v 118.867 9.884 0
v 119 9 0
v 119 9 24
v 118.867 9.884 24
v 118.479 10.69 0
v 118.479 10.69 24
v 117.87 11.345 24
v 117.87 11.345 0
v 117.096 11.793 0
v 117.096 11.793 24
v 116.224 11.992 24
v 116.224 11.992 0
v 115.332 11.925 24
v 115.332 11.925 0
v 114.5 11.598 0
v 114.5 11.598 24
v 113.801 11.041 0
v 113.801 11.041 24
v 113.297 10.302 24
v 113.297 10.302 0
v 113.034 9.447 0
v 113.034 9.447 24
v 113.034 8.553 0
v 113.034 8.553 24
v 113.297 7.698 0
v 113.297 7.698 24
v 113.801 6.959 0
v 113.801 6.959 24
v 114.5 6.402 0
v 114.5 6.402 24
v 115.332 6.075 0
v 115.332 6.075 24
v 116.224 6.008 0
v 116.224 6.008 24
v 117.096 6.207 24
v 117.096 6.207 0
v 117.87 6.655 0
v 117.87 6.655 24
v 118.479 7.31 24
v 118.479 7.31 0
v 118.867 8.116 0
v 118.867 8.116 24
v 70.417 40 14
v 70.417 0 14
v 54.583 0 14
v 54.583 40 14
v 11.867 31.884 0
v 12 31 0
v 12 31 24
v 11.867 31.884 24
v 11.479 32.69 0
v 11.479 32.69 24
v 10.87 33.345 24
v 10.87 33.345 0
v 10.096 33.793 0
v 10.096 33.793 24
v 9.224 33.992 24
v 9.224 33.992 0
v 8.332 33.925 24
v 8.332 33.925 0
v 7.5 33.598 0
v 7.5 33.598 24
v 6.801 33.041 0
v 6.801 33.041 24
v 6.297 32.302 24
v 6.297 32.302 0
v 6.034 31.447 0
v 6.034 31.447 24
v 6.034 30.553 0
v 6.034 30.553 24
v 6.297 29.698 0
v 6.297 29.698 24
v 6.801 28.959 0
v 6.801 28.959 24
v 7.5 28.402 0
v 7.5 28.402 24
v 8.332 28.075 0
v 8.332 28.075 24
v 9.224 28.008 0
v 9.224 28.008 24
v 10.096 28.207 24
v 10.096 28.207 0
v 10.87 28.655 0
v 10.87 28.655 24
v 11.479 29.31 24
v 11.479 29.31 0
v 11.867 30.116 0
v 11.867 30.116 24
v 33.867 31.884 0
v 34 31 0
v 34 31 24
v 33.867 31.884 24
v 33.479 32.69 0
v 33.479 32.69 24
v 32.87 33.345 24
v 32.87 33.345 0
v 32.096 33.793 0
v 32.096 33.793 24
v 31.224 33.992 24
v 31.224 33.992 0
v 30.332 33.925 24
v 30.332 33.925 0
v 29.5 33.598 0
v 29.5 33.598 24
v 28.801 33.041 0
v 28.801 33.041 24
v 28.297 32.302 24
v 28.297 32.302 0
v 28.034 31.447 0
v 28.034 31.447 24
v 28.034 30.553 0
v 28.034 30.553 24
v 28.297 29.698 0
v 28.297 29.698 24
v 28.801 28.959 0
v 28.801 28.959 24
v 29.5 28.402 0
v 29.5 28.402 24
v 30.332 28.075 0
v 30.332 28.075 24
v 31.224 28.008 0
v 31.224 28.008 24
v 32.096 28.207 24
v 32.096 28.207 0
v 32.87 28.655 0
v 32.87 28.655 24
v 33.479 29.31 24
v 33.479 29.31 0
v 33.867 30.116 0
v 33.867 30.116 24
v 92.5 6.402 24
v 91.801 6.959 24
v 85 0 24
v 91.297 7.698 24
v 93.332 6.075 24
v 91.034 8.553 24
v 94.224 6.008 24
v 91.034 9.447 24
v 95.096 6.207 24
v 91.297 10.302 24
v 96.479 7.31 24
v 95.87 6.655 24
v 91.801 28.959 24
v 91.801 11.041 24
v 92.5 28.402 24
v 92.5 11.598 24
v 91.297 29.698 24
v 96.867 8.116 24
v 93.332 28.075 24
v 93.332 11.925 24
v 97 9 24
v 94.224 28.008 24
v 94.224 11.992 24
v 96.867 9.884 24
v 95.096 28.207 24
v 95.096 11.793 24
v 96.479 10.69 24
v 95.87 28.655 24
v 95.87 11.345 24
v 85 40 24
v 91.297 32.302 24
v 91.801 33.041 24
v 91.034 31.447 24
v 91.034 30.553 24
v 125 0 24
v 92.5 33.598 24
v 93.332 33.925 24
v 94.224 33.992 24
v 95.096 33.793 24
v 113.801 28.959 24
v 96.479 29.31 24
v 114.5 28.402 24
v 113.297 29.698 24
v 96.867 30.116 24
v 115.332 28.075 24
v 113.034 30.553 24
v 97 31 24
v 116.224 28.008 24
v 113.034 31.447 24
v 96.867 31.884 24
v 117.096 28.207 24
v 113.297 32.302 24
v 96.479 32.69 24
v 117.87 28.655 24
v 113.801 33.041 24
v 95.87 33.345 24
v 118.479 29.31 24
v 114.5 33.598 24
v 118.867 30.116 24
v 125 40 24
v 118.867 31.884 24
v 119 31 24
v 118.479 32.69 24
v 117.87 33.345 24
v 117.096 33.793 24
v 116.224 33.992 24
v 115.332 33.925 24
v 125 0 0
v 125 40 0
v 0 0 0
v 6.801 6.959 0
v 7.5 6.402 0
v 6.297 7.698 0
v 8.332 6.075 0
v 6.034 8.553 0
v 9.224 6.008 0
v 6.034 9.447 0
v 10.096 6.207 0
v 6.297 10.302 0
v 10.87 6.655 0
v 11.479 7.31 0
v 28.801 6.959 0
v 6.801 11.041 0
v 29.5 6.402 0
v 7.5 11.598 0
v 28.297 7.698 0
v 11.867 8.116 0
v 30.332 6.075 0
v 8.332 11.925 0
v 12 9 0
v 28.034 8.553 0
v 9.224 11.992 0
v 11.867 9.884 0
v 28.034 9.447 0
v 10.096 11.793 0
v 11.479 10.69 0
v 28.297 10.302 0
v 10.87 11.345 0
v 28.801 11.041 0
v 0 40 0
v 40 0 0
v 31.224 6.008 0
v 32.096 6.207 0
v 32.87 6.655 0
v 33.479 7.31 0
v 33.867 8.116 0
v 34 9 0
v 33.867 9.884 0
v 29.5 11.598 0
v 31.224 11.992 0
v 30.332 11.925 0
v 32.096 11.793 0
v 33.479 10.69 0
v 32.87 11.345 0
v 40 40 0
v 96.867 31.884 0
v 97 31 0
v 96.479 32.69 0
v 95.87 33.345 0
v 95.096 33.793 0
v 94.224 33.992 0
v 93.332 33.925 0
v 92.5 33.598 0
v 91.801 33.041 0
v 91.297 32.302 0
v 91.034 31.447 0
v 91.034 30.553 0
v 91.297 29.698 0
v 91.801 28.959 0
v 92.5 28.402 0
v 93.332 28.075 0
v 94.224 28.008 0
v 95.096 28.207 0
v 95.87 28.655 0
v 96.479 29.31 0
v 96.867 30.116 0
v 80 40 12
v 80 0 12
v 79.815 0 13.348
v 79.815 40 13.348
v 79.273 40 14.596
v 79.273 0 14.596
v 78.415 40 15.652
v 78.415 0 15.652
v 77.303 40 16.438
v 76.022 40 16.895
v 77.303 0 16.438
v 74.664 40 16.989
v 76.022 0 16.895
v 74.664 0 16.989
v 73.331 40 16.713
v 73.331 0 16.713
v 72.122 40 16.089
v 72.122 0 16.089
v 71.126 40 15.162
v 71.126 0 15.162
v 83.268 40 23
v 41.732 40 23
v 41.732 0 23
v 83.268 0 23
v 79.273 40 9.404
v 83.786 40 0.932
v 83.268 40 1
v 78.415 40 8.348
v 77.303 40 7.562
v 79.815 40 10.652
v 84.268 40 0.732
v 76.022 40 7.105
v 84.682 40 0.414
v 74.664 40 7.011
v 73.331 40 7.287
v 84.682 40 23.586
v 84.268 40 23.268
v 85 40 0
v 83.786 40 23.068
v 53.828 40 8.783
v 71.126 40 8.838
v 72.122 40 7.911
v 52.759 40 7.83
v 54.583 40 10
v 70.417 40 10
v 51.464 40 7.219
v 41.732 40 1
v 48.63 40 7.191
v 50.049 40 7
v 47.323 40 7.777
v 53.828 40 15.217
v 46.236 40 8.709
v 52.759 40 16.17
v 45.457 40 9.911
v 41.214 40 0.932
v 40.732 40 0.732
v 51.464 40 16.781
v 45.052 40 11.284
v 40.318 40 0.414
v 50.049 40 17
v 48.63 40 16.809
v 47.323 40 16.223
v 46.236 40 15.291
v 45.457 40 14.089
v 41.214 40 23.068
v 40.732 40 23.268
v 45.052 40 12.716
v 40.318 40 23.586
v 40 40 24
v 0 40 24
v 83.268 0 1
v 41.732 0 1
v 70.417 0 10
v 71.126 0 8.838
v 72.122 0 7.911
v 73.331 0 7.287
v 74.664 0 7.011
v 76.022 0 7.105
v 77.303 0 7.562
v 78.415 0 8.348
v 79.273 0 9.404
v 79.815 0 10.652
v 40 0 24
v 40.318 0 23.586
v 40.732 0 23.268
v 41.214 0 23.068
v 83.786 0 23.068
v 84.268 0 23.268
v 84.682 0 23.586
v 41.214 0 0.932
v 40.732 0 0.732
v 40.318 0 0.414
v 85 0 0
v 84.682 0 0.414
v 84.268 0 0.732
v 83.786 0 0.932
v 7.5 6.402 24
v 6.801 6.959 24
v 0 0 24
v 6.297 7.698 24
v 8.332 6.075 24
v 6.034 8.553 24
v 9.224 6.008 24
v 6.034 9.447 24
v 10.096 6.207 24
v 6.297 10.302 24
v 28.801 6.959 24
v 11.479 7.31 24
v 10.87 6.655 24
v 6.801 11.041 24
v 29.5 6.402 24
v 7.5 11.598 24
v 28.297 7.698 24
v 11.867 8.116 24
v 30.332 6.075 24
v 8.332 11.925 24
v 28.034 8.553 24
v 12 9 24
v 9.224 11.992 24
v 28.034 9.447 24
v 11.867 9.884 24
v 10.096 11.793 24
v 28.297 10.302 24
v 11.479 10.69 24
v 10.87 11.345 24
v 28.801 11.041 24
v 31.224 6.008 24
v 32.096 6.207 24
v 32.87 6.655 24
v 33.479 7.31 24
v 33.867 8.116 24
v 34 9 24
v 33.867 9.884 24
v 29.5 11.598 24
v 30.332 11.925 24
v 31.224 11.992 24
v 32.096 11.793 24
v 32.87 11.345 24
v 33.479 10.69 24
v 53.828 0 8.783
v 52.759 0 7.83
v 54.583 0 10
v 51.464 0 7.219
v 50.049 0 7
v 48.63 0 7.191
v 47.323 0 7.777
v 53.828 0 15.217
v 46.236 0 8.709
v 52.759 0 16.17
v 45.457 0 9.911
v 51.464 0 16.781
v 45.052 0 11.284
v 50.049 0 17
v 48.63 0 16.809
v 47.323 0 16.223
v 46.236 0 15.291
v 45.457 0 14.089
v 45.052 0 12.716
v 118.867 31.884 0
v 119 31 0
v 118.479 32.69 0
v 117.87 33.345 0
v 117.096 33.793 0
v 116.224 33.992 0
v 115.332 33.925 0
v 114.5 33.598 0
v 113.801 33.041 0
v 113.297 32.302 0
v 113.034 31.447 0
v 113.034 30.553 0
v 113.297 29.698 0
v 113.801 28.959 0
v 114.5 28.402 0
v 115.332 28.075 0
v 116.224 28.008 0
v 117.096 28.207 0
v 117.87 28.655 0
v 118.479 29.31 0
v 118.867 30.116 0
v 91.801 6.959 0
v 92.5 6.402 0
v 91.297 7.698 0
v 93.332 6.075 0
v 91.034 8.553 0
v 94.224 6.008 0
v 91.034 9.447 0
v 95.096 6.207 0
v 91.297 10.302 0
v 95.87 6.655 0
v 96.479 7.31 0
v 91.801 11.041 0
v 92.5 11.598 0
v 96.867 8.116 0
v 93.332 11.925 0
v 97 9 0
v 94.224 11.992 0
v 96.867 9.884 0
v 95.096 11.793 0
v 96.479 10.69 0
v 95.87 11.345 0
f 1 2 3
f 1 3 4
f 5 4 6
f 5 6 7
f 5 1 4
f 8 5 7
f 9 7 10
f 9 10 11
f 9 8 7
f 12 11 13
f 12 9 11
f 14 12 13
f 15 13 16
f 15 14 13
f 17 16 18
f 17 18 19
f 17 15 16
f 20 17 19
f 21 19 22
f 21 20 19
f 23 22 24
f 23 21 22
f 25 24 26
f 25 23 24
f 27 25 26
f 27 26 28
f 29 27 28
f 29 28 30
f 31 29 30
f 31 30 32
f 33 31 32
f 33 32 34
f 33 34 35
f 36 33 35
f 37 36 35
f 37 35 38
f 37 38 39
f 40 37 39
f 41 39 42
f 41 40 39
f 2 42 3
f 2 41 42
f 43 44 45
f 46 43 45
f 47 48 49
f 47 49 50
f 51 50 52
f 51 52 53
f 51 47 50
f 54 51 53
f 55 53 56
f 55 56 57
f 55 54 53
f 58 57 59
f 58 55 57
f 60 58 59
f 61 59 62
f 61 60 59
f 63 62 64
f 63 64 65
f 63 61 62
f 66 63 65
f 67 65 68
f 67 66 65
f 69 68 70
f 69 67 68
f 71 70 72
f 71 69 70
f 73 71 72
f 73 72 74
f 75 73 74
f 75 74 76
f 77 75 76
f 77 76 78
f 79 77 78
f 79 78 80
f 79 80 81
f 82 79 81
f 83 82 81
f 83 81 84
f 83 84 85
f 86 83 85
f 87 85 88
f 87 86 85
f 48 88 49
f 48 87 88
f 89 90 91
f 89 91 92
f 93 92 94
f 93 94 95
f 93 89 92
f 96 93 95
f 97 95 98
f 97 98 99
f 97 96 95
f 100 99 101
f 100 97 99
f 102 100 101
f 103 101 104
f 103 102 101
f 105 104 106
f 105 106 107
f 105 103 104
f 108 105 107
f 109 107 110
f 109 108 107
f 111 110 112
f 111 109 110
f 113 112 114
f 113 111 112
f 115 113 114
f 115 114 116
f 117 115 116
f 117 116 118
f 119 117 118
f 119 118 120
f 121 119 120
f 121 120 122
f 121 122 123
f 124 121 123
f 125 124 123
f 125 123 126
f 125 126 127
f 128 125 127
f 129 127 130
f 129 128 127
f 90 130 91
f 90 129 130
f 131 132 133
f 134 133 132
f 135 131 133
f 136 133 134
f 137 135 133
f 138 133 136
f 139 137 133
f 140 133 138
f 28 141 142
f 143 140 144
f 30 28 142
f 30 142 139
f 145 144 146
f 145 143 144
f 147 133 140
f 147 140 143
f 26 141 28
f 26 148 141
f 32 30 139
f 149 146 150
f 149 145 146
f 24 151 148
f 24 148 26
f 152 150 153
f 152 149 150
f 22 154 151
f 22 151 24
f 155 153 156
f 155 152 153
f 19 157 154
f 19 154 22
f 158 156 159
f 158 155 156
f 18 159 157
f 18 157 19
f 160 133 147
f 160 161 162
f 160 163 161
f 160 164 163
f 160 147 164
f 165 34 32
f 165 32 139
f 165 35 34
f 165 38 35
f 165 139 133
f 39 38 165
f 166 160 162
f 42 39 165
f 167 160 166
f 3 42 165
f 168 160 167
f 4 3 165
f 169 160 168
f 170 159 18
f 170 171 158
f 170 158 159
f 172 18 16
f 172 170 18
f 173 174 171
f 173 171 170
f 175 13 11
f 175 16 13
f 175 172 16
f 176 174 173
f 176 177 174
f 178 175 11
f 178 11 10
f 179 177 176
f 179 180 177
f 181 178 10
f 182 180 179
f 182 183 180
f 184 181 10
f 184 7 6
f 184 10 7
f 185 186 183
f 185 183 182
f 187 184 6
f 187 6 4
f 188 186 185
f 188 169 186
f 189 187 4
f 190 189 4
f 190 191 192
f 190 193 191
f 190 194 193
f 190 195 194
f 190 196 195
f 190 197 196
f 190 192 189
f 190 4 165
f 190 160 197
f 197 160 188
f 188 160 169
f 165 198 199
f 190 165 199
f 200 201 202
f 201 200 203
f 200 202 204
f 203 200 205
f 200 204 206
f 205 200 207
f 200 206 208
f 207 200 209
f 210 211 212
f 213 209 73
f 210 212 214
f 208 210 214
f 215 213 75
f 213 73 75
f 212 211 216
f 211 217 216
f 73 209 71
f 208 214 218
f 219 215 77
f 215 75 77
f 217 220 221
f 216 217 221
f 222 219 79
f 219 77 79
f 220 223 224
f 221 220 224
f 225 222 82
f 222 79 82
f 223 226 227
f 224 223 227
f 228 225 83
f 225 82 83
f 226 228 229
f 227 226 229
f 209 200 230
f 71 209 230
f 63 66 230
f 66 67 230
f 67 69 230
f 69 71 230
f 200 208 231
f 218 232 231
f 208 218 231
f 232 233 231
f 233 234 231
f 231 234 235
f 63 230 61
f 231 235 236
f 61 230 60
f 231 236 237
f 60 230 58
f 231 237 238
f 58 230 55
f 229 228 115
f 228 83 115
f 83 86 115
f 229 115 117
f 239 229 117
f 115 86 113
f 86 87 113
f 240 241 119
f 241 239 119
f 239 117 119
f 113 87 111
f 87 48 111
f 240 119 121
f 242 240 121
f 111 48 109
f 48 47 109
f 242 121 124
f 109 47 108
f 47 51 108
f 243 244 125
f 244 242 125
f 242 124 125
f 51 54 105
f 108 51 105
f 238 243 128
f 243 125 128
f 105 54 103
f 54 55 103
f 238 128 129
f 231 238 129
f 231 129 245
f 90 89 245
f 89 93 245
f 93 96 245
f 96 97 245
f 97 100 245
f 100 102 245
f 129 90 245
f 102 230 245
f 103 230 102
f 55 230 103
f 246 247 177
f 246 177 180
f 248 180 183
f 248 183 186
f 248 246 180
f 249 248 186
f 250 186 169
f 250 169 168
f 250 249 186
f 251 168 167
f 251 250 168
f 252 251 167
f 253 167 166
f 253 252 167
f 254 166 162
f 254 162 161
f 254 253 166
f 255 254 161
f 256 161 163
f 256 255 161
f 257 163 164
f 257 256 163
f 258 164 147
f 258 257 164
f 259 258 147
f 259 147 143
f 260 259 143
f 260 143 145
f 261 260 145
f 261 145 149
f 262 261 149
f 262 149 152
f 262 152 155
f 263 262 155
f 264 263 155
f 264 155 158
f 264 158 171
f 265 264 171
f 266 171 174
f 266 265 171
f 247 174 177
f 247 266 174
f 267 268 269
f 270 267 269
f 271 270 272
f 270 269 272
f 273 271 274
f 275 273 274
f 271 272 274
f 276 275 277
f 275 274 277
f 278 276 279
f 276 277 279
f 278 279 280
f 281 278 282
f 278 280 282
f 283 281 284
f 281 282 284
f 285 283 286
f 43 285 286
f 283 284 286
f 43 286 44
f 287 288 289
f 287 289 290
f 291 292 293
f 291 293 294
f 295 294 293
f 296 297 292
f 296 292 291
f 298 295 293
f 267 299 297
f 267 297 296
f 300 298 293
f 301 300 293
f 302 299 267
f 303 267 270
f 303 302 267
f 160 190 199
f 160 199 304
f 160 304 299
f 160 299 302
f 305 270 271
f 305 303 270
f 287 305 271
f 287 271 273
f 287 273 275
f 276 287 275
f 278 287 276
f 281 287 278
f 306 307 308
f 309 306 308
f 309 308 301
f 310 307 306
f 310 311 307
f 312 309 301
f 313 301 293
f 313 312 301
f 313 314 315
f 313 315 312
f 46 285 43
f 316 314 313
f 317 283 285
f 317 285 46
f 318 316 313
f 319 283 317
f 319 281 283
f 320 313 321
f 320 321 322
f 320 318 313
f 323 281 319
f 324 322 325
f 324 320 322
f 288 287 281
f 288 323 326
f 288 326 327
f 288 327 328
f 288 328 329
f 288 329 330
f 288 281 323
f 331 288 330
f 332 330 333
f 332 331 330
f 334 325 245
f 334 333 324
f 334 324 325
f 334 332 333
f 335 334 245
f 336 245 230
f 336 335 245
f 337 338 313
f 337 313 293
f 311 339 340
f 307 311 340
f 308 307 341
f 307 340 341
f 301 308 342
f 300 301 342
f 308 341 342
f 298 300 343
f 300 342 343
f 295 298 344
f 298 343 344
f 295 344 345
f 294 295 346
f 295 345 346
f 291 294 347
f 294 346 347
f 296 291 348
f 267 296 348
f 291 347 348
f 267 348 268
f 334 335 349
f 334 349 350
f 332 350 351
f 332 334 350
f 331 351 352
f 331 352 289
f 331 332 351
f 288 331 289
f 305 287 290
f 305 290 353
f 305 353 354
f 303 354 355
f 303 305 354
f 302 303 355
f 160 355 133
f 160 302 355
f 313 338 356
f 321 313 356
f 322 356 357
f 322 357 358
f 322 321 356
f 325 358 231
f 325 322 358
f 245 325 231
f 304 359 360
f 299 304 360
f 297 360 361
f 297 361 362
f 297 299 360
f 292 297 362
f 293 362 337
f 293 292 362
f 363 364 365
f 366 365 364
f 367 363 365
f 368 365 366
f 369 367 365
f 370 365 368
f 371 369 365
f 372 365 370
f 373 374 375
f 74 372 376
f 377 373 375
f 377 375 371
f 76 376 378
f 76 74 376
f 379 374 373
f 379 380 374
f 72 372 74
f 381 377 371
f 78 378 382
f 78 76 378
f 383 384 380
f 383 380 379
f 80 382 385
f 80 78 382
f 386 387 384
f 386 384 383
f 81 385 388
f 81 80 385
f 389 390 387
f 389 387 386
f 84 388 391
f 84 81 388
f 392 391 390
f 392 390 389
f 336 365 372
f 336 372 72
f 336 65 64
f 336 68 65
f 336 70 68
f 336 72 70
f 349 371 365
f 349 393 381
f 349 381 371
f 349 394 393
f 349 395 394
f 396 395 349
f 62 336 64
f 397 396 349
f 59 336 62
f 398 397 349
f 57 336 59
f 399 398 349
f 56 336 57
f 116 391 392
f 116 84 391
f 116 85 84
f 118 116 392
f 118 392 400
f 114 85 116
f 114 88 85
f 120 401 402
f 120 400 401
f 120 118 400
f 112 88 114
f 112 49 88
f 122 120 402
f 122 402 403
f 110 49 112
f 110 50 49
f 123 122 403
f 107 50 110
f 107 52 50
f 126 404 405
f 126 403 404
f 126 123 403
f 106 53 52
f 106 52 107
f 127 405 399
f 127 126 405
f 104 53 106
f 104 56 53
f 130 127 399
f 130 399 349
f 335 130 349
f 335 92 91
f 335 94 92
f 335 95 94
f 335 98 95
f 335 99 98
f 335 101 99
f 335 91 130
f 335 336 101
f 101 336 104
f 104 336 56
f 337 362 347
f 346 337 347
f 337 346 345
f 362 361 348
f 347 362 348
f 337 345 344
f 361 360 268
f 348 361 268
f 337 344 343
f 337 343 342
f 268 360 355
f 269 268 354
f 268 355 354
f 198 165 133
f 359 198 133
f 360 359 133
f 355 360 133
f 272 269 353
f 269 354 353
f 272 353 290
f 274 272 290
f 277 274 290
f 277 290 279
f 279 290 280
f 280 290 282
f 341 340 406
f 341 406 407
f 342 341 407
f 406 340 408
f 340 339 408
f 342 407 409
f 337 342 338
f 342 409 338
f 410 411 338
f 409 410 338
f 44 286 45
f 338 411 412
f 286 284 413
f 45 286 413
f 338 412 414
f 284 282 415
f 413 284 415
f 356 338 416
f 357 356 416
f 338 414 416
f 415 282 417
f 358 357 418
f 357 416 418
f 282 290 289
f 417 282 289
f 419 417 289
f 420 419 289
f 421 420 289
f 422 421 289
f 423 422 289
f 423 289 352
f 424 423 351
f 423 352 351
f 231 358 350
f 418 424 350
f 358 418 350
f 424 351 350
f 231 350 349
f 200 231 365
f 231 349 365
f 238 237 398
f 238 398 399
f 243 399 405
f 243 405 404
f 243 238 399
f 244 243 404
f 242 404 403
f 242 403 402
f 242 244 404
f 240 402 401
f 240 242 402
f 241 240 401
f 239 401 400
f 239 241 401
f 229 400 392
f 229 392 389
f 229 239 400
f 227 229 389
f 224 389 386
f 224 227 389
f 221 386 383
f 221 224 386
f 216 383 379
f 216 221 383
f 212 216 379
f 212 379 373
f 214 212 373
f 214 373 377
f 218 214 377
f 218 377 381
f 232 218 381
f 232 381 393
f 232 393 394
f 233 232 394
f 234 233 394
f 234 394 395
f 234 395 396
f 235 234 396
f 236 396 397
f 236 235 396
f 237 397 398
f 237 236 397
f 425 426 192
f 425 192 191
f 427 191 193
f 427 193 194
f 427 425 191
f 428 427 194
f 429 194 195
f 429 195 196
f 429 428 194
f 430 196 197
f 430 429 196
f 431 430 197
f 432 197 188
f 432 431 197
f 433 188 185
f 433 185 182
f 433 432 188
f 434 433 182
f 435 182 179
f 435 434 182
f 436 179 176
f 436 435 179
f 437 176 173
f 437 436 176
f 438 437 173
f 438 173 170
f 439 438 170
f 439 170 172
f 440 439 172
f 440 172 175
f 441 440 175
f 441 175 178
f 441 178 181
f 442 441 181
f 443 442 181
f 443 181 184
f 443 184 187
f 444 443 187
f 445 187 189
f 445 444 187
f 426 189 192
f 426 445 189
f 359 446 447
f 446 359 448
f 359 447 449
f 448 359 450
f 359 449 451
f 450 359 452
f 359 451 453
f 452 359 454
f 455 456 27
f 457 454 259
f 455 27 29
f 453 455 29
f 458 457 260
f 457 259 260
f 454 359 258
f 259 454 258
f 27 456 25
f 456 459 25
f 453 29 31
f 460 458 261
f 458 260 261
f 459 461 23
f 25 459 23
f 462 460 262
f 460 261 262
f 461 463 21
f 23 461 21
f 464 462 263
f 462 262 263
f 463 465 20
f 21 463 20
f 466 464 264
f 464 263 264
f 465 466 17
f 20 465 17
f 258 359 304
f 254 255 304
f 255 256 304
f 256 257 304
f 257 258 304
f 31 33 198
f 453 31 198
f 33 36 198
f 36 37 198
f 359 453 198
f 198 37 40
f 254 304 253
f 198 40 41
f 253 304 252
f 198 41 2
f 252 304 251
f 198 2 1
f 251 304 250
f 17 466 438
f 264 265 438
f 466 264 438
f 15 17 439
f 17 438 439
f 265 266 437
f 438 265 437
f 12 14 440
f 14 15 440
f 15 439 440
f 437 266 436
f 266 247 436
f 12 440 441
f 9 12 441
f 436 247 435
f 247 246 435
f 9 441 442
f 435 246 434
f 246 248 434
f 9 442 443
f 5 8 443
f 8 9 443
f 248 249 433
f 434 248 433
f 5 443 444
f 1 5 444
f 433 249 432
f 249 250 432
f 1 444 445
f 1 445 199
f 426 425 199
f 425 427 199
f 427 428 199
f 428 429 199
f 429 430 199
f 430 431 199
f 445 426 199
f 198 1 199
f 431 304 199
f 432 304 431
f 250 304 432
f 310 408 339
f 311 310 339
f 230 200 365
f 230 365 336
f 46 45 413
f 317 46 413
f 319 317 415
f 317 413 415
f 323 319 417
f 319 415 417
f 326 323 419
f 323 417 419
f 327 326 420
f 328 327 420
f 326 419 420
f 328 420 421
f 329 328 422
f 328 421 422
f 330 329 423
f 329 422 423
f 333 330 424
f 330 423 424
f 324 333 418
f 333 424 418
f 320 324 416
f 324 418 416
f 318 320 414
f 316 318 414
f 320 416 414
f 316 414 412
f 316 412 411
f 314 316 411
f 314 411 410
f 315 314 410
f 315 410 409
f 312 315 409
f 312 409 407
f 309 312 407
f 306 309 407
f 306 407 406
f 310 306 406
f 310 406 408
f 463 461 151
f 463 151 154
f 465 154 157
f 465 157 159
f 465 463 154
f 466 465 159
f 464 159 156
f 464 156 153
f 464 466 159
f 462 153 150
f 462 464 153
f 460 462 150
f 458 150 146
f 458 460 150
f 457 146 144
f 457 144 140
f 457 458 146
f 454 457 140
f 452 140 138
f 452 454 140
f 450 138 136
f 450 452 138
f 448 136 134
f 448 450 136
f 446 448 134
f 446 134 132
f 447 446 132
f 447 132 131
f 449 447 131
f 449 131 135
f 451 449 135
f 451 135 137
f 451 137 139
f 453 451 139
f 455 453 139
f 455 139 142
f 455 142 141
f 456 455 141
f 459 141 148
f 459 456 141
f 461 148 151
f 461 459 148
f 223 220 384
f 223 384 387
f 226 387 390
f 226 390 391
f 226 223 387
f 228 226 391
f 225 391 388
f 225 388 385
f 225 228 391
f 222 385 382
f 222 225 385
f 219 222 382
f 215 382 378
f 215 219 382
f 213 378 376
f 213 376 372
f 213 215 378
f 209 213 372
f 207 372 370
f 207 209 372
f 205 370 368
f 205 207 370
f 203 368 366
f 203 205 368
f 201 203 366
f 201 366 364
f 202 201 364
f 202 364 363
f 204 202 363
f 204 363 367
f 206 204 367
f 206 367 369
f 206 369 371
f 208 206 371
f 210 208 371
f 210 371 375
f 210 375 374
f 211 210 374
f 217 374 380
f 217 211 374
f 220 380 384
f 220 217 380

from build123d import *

# Parameters (mm, degrees)
F0_W        = 125
F0_H        = 40
F0_R        = 3
F1_DEPTH    = 24
F3_DEPTH    = 45
F4_W        = 45
F4_H        = 40
F5_DEPTH    = 1
F6_W        = 45
F6_H        = 40
F7_DEPTH    = 1
F8_T1_DEPTH = 40


# Not quite as in the source:
# - a fillet or chamfer that OpenCascade refuses, or shapes differently, is made with other operations: its cross-section is extruded or revolved along the edge and cut away or added


with BuildPart() as f1:
    # F0 (on Top) → F1 (new body)
    with BuildSketch(Plane.XY):
        with Locations((62.5, 20)):
            Rectangle(F0_W, F0_H)
        with Locations((9, 9)):
            Circle(F0_R, mode=Mode.SUBTRACT)
        with Locations((31, 9)):
            Circle(F0_R, mode=Mode.SUBTRACT)
        with Locations((94, 9)):
            Circle(F0_R, mode=Mode.SUBTRACT)
        with Locations((116, 9)):
            Circle(F0_R, mode=Mode.SUBTRACT)
        with Locations((9, 31)):
            Circle(F0_R, mode=Mode.SUBTRACT)
        with Locations((31, 31)):
            Circle(F0_R, mode=Mode.SUBTRACT)
        with Locations((94, 31)):
            Circle(F0_R, mode=Mode.SUBTRACT)
        with Locations((116, 31)):
            Circle(F0_R, mode=Mode.SUBTRACT)
    extrude(amount=F1_DEPTH)

    # F2 (on face) → F3 (cut)
    with BuildSketch(Plane.XZ):
        with BuildLine():
            Line((54, 14), (54.582575695, 14))
            ThreePointArc((54.582575695, 14), (45, 12), (54.582575695, 10))
            Line((54.582575695, 10), (54, 10))
            Line((54, 10), (54, 14))
        make_face()
        with BuildLine():
            ThreePointArc((54.582575695, 10), (54.8945315647, 10.9784517816), (55, 12))
            ThreePointArc((55, 12), (54.8945315647, 13.0215482184), (54.582575695, 14))
            Line((54.582575695, 14), (54, 14))
            Line((54, 14), (54, 10))
            Line((54, 10), (54.582575695, 10))
        make_face()
        with BuildLine():
            ThreePointArc((54.582575695, 14), (54.8945315647, 13.0215482184), (55, 12))
            ThreePointArc((55, 12), (54.8945315647, 10.9784517816), (54.582575695, 10))
            Line((54.582575695, 10), (70.417424305, 10))
            ThreePointArc((70.417424305, 10), (70, 12), (70.417424305, 14))
            Line((70.417424305, 14), (54.582575695, 14))
        make_face()
        with BuildLine():
            Line((71, 14), (70.417424305, 14))
            ThreePointArc((70.417424305, 14), (70, 12), (70.417424305, 10))
            Line((70.417424305, 10), (71, 10))
            Line((71, 10), (71, 14))
        make_face()
        with BuildLine():
            ThreePointArc((80, 12), (76.0215482184, 16.8945315647), (70.417424305, 14))
            Line((70.417424305, 14), (71, 14))
            Line((71, 14), (71, 10))
            Line((71, 10), (70.417424305, 10))
            ThreePointArc((70.417424305, 10), (76.0215482184, 7.1054684353), (80, 12))
        make_face()
    extrude(amount=-F3_DEPTH, mode=Mode.SUBTRACT)

    # F4 (on face) → F5 (cut)
    with BuildSketch(Plane.XY.offset(24)):
        with Locations((62.5, 20)):
            Rectangle(F4_W, F4_H)
    extrude(amount=-F5_DEPTH, mode=Mode.SUBTRACT)

    # F6 (on face) → F7 (cut)
    with BuildSketch(Plane(origin=(0, 0, 0), x_dir=(1, 0, 0), z_dir=(0, 0, -1))):
        with Locations((62.5, -20)):
            Rectangle(F6_W, F6_H)
    extrude(amount=-F7_DEPTH, mode=Mode.SUBTRACT)

    # F8: fillet of radius 2 on 4 edges, made by hand

    # F8_s2 → F8_t1 (join)
    with BuildSketch(Plane.XZ.offset(-40)):
        with BuildLine():
            ThreePointArc((41.7320508076, 1), (40.7320508076, 0.7320508076), (40, 0))
            Line((40, 0), (40, 1))
            Line((40, 1), (41.7320508076, 1))
        make_face()
        with BuildLine():
            ThreePointArc((85, 0), (84.2679491924, 0.7320508076), (83.2679491924, 1))
            Line((83.2679491924, 1), (85, 1))
            Line((85, 1), (85, 0))
        make_face()
        with BuildLine():
            ThreePointArc((83.2679491924, 23), (84.2679491924, 23.2679491924), (85, 24))
            Line((85, 24), (85, 23))
            Line((85, 23), (83.2679491924, 23))
        make_face()
        with BuildLine():
            ThreePointArc((40, 24), (40.7320508076, 23.2679491924), (41.7320508076, 23))
            Line((41.7320508076, 23), (40, 23))
            Line((40, 23), (40, 24))
        make_face()
    extrude(amount=F8_T1_DEPTH)


solid = f1.part
